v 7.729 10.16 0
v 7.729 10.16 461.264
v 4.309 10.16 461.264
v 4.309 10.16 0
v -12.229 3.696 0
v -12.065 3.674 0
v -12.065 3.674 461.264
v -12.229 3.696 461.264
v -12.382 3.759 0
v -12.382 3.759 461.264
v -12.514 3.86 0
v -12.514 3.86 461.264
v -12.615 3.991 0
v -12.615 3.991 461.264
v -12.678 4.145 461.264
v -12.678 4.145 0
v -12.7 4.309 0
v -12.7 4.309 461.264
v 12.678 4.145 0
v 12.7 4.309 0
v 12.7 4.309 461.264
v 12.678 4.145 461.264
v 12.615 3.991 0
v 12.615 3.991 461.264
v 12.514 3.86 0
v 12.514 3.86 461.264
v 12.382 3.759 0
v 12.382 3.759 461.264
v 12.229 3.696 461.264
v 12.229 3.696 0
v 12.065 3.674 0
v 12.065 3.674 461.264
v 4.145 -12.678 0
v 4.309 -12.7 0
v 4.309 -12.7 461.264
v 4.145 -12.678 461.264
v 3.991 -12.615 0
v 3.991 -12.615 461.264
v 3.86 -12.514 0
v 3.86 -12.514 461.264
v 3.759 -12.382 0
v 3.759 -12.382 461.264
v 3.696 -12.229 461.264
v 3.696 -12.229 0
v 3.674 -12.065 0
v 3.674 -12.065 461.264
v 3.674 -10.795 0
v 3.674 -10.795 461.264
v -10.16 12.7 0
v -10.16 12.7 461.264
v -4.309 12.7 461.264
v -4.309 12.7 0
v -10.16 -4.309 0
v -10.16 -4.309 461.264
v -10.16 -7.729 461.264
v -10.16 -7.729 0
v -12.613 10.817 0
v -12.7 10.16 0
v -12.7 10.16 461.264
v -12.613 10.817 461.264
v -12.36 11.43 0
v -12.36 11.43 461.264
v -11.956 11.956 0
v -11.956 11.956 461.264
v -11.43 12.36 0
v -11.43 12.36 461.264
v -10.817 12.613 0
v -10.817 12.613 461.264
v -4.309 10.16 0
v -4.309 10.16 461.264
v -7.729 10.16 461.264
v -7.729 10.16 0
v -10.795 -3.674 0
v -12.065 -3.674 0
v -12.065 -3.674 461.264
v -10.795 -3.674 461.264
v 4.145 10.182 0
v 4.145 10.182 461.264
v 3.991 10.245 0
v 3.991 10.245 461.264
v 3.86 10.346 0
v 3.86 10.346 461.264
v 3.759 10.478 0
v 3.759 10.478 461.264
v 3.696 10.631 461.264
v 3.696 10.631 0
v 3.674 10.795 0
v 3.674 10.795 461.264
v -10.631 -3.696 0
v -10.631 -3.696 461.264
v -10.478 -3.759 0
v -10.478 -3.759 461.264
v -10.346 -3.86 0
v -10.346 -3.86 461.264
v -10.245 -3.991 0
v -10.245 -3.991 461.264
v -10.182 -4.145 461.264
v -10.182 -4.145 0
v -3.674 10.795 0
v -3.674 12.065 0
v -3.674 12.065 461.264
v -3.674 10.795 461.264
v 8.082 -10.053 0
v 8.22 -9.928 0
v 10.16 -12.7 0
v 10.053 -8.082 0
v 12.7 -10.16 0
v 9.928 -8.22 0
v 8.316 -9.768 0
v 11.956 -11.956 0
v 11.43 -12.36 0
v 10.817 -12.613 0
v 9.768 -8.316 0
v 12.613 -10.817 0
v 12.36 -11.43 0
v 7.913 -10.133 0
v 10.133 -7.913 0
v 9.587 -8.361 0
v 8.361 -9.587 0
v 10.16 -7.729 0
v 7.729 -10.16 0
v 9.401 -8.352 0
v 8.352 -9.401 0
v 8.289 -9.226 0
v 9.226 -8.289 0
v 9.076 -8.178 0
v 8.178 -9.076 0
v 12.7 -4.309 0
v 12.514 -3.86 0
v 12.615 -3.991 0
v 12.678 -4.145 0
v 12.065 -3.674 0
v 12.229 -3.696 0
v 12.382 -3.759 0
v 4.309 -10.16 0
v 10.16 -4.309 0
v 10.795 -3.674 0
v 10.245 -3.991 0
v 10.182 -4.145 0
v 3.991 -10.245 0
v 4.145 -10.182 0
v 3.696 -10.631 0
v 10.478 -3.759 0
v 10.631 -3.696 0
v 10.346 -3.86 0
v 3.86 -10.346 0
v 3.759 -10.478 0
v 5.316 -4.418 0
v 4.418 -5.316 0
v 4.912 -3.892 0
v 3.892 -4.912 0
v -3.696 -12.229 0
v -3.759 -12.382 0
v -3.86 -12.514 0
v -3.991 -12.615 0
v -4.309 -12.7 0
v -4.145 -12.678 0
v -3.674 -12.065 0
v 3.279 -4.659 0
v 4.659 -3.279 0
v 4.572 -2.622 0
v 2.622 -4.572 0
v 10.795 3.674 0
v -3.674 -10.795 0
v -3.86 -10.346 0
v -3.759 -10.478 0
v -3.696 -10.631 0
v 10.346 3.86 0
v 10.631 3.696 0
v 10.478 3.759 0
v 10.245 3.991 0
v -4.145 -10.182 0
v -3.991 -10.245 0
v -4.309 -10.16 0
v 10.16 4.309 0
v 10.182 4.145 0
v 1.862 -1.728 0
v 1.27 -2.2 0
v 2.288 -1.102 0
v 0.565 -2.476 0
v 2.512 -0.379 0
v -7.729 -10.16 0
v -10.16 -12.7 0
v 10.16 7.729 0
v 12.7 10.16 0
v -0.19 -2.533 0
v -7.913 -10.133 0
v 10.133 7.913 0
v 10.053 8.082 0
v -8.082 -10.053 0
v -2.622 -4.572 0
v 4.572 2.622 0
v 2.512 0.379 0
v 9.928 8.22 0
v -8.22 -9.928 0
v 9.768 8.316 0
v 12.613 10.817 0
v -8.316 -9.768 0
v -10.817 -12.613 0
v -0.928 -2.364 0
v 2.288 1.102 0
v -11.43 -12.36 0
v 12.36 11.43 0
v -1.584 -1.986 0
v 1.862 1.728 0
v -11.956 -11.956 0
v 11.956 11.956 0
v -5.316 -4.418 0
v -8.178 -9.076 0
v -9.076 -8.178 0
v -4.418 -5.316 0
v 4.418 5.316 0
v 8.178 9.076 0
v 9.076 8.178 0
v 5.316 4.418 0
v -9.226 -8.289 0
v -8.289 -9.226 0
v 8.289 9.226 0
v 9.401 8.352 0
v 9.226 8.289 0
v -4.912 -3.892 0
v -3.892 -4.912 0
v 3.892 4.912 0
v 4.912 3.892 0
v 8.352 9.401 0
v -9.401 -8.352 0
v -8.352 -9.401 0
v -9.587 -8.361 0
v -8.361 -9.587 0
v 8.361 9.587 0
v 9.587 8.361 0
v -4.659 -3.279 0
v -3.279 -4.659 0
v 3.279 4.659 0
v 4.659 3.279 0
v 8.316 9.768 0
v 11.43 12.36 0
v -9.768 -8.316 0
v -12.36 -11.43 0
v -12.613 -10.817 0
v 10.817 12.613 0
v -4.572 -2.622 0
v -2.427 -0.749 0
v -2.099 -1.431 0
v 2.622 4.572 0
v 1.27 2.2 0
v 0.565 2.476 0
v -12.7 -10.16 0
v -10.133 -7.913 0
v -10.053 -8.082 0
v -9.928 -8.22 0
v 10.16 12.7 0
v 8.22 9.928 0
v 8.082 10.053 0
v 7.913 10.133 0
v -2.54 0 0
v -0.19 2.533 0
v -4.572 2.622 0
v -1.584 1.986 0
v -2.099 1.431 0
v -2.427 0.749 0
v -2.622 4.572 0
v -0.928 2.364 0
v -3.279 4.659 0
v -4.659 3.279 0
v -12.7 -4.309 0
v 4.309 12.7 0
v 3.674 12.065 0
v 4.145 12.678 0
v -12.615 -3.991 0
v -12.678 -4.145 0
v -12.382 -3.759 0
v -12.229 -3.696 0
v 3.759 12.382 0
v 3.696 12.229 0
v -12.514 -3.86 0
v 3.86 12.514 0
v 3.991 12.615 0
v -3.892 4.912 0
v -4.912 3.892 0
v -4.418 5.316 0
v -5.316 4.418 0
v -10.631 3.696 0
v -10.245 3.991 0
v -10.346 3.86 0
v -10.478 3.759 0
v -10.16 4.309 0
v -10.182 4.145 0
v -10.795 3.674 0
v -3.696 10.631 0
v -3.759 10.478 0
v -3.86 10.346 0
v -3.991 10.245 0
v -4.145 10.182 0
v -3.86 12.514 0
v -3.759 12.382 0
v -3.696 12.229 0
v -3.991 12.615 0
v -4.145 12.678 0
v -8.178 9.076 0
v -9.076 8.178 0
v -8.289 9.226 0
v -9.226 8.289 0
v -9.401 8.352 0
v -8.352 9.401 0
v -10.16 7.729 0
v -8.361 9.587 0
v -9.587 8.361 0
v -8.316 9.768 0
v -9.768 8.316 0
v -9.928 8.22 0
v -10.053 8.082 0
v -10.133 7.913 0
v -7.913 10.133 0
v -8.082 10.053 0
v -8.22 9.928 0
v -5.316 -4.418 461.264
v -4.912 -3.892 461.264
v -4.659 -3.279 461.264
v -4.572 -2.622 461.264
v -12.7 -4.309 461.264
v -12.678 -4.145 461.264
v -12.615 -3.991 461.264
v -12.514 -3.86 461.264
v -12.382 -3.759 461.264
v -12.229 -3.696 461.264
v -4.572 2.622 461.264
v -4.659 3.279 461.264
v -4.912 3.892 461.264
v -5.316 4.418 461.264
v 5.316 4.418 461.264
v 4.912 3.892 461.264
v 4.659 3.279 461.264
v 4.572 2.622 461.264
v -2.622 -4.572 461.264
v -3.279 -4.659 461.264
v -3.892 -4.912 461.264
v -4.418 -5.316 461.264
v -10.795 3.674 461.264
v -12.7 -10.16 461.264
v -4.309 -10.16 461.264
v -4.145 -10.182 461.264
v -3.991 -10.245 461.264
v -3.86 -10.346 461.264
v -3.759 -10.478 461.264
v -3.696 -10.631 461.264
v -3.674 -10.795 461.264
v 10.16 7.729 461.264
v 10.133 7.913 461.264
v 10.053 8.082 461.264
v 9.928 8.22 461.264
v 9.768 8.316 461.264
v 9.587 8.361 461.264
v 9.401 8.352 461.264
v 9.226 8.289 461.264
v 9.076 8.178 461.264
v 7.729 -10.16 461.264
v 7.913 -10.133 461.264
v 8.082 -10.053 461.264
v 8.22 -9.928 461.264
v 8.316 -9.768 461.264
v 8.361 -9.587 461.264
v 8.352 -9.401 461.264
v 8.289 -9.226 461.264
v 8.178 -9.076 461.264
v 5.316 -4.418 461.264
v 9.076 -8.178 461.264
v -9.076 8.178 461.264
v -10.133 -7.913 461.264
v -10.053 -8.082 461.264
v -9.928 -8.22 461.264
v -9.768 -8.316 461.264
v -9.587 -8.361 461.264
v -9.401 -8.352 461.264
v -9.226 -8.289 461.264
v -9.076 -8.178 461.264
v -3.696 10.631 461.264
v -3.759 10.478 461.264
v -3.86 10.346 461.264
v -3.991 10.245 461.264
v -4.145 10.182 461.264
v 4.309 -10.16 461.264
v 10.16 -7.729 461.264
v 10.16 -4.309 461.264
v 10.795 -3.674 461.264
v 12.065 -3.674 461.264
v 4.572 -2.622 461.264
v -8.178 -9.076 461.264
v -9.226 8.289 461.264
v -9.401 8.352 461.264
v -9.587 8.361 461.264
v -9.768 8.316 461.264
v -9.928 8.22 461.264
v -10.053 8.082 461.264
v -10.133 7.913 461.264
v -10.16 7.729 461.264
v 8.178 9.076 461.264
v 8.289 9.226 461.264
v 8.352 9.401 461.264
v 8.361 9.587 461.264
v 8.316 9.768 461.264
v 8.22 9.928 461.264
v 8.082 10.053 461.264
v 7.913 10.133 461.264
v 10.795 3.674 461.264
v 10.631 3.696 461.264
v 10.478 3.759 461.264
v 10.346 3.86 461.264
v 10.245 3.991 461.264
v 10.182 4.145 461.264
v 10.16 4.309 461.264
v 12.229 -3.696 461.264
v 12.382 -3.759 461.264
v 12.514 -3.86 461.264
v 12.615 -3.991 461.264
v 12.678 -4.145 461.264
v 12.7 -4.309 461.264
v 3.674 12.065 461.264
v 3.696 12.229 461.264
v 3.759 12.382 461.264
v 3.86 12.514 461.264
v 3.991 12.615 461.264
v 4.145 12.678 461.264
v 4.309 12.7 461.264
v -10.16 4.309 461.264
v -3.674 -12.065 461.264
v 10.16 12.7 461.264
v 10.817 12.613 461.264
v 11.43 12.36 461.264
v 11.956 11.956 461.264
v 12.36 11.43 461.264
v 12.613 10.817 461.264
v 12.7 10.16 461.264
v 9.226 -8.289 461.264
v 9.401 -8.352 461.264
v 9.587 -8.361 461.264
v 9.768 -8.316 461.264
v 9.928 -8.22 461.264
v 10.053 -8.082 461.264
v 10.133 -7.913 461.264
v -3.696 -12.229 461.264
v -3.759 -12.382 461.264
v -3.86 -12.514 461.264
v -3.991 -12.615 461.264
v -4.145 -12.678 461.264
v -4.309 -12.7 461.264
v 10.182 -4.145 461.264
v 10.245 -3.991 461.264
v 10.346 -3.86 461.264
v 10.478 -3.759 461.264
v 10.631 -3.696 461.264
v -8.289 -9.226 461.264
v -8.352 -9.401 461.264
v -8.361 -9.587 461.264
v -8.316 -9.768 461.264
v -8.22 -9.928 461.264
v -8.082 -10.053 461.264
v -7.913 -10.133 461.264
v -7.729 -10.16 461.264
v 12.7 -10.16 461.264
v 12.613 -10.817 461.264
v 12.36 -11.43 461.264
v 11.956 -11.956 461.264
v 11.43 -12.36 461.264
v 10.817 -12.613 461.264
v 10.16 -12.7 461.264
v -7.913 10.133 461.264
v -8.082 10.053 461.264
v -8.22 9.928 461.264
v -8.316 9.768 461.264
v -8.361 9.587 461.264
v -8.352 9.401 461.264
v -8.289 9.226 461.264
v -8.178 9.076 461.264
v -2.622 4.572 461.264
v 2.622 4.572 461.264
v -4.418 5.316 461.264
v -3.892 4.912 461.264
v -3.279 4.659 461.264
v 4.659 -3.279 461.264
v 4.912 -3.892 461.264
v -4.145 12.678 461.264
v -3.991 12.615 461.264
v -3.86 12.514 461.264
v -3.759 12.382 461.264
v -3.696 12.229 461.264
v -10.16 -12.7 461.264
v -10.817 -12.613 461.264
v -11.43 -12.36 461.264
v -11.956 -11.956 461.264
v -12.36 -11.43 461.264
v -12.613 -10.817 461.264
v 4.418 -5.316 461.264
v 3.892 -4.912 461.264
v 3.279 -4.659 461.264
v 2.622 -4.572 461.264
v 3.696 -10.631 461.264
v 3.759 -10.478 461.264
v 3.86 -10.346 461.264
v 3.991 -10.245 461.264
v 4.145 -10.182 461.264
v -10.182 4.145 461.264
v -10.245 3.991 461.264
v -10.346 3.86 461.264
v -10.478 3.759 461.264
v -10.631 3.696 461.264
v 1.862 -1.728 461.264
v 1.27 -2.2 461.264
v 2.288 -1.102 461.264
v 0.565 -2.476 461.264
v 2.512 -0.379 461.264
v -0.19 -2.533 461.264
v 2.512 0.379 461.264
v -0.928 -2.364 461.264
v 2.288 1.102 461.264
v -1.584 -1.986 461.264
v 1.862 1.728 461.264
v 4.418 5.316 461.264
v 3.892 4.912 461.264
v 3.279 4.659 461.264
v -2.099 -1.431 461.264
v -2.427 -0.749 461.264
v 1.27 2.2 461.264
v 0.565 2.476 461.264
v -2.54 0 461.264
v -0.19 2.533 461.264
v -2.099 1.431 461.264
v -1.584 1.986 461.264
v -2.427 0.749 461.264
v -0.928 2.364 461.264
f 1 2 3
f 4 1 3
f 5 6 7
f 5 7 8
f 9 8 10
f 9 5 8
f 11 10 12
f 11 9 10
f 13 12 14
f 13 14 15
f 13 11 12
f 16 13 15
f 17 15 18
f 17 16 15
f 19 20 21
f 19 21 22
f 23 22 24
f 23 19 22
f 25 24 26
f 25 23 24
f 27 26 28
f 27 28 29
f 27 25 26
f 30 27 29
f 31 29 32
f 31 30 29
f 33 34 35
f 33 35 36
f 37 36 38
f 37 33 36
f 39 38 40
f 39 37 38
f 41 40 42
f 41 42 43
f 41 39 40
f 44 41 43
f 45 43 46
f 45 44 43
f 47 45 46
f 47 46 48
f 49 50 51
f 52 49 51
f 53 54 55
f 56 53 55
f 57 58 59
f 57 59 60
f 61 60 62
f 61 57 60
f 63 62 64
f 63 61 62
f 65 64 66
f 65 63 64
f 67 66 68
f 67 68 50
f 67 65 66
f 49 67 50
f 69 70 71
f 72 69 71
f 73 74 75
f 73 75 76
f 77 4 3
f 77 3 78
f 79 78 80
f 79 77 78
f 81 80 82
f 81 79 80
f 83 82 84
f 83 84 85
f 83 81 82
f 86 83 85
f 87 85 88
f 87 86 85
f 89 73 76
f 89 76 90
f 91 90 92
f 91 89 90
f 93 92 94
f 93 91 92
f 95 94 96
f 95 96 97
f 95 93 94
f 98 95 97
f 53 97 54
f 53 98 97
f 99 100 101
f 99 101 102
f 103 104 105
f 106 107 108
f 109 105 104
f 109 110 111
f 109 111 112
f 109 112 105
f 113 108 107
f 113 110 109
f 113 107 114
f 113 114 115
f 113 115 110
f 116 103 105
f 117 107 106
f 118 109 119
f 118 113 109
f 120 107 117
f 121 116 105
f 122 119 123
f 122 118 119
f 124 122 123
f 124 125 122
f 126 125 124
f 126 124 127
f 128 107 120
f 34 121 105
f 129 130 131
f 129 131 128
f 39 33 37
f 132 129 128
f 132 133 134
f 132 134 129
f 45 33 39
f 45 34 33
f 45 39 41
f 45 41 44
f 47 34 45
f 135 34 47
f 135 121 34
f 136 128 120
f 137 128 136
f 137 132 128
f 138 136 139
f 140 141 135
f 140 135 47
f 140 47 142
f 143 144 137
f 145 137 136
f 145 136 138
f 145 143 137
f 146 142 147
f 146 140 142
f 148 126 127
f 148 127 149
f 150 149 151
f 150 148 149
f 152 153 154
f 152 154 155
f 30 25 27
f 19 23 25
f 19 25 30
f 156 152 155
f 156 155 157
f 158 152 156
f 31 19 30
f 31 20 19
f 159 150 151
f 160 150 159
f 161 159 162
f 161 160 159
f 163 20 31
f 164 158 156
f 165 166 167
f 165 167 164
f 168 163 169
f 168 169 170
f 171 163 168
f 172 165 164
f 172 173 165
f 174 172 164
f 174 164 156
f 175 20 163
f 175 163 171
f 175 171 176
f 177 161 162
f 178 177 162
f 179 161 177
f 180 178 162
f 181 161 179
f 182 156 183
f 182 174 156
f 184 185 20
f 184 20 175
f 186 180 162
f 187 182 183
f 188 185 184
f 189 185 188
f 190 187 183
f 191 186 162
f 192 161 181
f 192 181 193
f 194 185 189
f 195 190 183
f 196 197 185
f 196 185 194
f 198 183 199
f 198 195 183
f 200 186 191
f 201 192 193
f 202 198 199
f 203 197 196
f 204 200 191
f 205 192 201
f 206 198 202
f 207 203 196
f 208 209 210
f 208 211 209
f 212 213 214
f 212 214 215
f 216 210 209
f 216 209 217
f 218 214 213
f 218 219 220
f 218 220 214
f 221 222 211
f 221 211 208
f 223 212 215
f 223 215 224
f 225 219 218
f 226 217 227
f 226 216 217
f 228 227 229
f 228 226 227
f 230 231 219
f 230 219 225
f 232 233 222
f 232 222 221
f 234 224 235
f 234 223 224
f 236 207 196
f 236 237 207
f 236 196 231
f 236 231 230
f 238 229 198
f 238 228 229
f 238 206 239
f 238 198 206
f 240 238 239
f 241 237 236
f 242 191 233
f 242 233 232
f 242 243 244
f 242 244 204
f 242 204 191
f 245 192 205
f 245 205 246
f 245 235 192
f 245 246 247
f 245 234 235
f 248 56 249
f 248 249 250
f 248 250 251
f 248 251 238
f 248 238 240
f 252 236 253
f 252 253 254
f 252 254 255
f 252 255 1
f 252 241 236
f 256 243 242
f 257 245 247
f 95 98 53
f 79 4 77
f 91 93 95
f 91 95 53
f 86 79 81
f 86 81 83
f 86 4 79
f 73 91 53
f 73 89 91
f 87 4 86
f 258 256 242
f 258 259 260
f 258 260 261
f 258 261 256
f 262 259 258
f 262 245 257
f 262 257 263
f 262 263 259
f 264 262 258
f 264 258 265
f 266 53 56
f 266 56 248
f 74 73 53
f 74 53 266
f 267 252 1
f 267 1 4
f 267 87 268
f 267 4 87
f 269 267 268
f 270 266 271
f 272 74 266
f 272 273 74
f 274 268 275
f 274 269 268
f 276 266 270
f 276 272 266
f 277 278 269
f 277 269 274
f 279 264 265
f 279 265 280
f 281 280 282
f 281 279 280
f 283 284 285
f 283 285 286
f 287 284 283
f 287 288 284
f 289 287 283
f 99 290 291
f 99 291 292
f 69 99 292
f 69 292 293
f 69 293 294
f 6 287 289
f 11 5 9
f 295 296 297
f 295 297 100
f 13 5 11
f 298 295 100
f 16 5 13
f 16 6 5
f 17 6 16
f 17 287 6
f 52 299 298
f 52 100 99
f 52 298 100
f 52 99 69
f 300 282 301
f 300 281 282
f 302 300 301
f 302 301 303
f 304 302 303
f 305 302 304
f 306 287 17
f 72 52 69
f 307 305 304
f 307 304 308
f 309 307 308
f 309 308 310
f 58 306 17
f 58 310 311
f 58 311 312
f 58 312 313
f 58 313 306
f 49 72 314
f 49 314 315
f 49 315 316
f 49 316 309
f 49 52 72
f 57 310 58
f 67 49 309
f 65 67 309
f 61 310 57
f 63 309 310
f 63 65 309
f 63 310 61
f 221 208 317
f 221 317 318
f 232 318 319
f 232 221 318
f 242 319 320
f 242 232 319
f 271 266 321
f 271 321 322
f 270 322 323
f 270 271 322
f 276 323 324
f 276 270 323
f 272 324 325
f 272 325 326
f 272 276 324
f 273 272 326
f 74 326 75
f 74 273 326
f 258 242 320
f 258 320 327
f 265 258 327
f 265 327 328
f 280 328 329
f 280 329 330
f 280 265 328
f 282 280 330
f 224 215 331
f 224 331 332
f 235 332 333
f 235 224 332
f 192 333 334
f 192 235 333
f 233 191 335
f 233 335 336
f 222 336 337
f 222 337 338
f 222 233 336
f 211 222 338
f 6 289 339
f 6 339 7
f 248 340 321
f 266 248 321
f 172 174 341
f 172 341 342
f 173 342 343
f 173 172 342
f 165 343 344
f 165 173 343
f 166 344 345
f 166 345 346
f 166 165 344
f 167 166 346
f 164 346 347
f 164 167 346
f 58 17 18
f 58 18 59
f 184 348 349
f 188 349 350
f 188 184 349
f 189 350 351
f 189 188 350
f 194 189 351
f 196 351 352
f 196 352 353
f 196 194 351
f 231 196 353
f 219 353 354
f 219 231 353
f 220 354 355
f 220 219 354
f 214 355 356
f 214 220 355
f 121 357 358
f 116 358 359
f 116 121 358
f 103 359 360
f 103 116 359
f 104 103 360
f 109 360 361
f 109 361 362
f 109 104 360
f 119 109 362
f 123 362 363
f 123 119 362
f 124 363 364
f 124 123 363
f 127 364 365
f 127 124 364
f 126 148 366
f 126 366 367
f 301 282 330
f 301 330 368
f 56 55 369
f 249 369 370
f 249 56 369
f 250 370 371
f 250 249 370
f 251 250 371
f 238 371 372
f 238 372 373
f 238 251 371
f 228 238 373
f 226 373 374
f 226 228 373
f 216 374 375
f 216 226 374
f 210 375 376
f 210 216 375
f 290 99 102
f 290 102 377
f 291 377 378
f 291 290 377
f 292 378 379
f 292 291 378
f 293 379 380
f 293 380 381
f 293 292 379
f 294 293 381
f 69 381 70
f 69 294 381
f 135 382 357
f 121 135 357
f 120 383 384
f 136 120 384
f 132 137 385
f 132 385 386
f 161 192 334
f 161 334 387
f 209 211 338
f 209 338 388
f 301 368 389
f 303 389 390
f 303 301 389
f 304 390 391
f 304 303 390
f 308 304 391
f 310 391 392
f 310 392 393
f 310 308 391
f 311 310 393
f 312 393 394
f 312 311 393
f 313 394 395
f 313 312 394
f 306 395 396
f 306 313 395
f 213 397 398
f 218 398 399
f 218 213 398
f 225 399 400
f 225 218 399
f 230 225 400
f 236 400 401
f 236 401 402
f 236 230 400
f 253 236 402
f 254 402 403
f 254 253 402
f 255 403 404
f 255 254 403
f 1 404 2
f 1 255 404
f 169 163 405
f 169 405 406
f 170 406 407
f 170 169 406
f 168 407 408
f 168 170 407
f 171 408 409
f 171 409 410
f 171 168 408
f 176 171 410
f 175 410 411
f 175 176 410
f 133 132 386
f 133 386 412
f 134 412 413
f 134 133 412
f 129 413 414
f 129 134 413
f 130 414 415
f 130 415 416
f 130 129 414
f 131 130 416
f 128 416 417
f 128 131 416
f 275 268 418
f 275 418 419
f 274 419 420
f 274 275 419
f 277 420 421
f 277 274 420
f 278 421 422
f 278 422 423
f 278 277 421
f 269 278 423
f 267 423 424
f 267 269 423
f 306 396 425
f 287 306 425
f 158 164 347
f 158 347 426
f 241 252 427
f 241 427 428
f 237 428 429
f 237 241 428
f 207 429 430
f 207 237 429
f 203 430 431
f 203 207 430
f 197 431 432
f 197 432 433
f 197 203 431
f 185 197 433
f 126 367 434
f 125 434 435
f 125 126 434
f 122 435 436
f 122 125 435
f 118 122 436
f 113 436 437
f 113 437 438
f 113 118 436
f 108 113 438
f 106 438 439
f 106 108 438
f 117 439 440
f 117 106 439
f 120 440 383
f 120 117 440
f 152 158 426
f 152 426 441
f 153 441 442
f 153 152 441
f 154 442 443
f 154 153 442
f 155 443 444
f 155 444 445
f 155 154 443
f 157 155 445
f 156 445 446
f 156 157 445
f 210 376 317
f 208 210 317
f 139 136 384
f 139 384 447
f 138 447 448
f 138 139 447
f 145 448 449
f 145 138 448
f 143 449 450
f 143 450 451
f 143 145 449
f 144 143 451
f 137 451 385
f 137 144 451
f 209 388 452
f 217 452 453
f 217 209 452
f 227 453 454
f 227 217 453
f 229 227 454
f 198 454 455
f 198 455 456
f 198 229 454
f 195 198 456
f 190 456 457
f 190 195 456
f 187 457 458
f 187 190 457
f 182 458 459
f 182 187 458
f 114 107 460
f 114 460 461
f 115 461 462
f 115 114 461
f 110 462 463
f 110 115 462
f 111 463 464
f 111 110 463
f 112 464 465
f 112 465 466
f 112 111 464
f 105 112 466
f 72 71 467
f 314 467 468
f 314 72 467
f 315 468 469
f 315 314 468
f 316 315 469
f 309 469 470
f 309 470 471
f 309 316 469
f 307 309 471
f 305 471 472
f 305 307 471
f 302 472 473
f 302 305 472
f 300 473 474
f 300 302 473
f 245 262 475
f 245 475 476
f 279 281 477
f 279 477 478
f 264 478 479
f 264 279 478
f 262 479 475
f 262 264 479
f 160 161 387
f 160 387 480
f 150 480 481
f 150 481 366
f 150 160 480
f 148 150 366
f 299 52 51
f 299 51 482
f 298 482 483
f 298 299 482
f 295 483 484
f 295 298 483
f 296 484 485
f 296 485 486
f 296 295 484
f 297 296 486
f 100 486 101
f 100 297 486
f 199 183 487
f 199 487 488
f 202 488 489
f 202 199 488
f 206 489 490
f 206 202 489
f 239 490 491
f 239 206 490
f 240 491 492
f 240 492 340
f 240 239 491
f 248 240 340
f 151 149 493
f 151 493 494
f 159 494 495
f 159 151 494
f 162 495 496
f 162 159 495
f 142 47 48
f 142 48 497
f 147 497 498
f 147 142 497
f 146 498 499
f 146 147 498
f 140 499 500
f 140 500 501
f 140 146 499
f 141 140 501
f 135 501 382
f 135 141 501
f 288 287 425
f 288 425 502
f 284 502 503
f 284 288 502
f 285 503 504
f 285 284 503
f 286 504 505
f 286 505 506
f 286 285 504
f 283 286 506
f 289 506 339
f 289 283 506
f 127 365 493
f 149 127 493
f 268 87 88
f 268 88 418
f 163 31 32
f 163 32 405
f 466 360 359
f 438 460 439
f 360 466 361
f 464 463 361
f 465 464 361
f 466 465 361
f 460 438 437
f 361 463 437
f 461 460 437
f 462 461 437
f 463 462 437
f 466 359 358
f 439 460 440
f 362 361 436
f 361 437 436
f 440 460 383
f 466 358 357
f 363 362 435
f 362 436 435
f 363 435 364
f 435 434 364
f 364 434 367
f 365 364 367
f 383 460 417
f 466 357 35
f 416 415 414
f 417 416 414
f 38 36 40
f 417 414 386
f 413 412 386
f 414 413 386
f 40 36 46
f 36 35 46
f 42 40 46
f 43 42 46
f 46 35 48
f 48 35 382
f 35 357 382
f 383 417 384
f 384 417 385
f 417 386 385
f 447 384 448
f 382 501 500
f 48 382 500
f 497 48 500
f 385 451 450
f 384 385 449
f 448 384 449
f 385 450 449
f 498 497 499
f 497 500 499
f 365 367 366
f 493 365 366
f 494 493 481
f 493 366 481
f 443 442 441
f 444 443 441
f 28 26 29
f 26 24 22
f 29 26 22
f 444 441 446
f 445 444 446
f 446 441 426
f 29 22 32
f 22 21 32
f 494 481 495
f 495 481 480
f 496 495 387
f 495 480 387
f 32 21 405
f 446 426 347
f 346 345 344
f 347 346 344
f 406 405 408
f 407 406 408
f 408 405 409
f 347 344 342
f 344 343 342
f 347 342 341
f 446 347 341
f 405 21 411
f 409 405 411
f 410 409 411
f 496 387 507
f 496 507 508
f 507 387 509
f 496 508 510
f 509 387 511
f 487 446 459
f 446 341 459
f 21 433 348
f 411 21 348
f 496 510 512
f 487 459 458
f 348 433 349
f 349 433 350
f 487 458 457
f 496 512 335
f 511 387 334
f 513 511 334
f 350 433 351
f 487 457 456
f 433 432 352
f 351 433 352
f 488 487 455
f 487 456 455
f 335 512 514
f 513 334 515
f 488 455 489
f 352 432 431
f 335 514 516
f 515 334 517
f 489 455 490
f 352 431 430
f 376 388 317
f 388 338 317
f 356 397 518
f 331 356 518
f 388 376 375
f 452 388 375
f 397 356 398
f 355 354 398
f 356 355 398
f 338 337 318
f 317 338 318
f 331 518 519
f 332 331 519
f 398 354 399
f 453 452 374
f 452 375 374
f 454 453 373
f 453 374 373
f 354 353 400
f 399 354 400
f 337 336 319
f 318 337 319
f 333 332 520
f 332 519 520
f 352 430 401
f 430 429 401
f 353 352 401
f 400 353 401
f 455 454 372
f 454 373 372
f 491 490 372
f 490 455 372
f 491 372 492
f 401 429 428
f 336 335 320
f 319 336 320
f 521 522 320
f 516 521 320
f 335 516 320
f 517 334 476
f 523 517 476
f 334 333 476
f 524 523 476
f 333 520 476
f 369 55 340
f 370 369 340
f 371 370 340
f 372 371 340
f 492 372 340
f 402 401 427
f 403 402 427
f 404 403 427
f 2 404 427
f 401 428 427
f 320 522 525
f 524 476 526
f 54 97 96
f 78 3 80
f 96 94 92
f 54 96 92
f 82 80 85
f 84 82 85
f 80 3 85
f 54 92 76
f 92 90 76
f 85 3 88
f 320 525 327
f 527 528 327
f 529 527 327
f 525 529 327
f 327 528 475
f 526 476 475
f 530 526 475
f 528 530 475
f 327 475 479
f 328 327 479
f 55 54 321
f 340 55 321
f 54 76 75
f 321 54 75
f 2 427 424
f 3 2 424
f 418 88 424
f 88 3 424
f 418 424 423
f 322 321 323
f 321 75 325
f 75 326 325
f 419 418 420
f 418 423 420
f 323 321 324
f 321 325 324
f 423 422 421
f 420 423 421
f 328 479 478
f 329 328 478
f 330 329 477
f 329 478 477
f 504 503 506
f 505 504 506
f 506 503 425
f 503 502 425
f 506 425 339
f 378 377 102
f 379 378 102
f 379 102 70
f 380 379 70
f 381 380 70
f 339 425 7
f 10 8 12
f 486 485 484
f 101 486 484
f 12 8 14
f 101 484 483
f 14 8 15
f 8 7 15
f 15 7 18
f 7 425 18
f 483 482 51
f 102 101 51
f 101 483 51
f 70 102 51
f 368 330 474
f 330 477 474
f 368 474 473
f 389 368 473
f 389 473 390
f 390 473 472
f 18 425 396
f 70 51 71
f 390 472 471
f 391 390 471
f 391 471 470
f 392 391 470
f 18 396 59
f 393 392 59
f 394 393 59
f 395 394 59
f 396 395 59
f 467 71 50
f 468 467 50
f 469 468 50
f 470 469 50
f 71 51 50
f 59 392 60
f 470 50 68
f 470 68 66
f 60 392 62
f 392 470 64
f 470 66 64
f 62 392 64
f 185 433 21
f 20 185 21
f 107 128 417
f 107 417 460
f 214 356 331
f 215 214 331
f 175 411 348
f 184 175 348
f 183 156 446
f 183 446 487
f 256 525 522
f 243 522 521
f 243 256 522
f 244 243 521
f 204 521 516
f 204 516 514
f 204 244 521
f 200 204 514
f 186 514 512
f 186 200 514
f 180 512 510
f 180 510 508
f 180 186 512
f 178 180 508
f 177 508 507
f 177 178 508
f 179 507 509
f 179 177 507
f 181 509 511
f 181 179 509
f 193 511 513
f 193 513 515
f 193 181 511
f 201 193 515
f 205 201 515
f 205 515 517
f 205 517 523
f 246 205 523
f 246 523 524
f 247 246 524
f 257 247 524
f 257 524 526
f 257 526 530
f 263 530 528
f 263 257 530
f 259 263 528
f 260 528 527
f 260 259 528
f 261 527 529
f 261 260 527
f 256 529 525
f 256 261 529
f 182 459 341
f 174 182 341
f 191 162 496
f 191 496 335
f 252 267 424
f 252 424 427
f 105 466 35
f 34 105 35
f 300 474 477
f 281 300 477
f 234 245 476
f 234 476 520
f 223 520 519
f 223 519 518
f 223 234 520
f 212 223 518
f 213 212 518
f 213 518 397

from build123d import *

# Parameters (mm, degrees)
SKETCH1_R           = 2.54
BOSS_EXTRUDE1_DEPTH = 461.264


with BuildPart() as part:
    # Sketch1 → Boss-Extrude1 (new body)
    with BuildSketch(Plane.XY):
        with BuildLine():
            Line((4.417923164, 5.315948776), (8.177961582, 9.075987194))
            ThreePointArc((8.177961582, 9.075987194), (8.315612279, 9.76800398), (7.728948776, 10.16))
            Line((7.728948776, 10.16), (4.308974388, 10.16))
            ThreePointArc((4.308974388, 10.16), (3.859961582, 10.345987194), (3.673974388, 10.795))
            Line((3.673974388, 10.795), (3.673974388, 12.065))
            ThreePointArc((3.673974388, 12.065), (3.859961582, 12.514012806), (4.308974388, 12.7))
            Line((4.308974388, 12.7), (10.16, 12.7))
            ThreePointArc((10.16, 12.7), (11.956051224, 11.956051224), (12.7, 10.16))
            Line((12.7, 10.16), (12.7, 4.308974388))
            ThreePointArc((12.7, 4.308974388), (12.514012806, 3.859961582), (12.065, 3.673974388))
            Line((12.065, 3.673974388), (10.795, 3.673974388))
            ThreePointArc((10.795, 3.673974388), (10.345987194, 3.859961582), (10.16, 4.308974388))
            Line((10.16, 4.308974388), (10.16, 7.728948776))
            ThreePointArc((10.16, 7.728948776), (9.76800398, 8.315612279), (9.075987194, 8.177961582))
            Line((9.075987194, 8.177961582), (5.315948776, 4.417923164))
            ThreePointArc((5.315948776, 4.417923164), (4.765345987, 3.593887858), (4.572, 2.621871939))
            Line((4.572, 2.621871939), (4.572, -2.621871939))
            ThreePointArc((4.572, -2.621871939), (4.765345987, -3.593887858), (5.315948776, -4.417923164))
            Line((5.315948776, -4.417923164), (9.075987194, -8.177961582))
            ThreePointArc((9.075987194, -8.177961582), (9.76800398, -8.315612279), (10.16, -7.728948776))
            Line((10.16, -7.728948776), (10.16, -4.308974388))
            ThreePointArc((10.16, -4.308974388), (10.345987194, -3.859961582), (10.795, -3.673974388))
            Line((10.795, -3.673974388), (12.065, -3.673974388))
            ThreePointArc((12.065, -3.673974388), (12.514012806, -3.859961582), (12.7, -4.308974388))
            Line((12.7, -4.308974388), (12.7, -10.16))
            ThreePointArc((12.7, -10.16), (11.956051224, -11.956051224), (10.16, -12.7))
            Line((10.16, -12.7), (4.308974388, -12.7))
            ThreePointArc((4.308974388, -12.7), (3.859961582, -12.514012806), (3.673974388, -12.065))
            Line((3.673974388, -12.065), (3.673974388, -10.795))
            ThreePointArc((3.673974388, -10.795), (3.859961582, -10.345987194), (4.308974388, -10.16))
            Line((4.308974388, -10.16), (7.728948776, -10.16))
            ThreePointArc((7.728948776, -10.16), (8.315612279, -9.76800398), (8.177961582, -9.075987194))
            Line((8.177961582, -9.075987194), (4.417923164, -5.315948776))
            ThreePointArc((4.417923164, -5.315948776), (3.593887858, -4.765345987), (2.621871939, -4.572))
            Line((2.621871939, -4.572), (-2.621871939, -4.572))
            ThreePointArc((-2.621871939, -4.572), (-3.593887858, -4.765345987), (-4.417923164, -5.315948776))
            Line((-4.417923164, -5.315948776), (-8.177961582, -9.075987194))
            ThreePointArc((-8.177961582, -9.075987194), (-8.315612279, -9.76800398), (-7.728948776, -10.16))
            Line((-7.728948776, -10.16), (-4.308974388, -10.16))
            ThreePointArc((-4.308974388, -10.16), (-3.859961582, -10.345987194), (-3.673974388, -10.795))
            Line((-3.673974388, -10.795), (-3.673974388, -12.065))
            ThreePointArc((-3.673974388, -12.065), (-3.859961582, -12.514012806), (-4.308974388, -12.7))
            Line((-4.308974388, -12.7), (-10.16, -12.7))
            ThreePointArc((-10.16, -12.7), (-11.956051224, -11.956051224), (-12.7, -10.16))
            Line((-12.7, -10.16), (-12.7, -4.308974388))
            ThreePointArc((-12.7, -4.308974388), (-12.514012806, -3.859961582), (-12.065, -3.673974388))
            Line((-12.065, -3.673974388), (-10.795, -3.673974388))
            ThreePointArc((-10.795, -3.673974388), (-10.345987194, -3.859961582), (-10.16, -4.308974388))
            Line((-10.16, -4.308974388), (-10.16, -7.728948776))
            ThreePointArc((-10.16, -7.728948776), (-9.76800398, -8.315612279), (-9.075987194, -8.177961582))
            Line((-9.075987194, -8.177961582), (-5.315948776, -4.417923164))
            ThreePointArc((-5.315948776, -4.417923164), (-4.765345987, -3.593887858), (-4.572, -2.621871939))
            Line((-4.572, -2.621871939), (-4.572, 2.621871939))
            ThreePointArc((-4.572, 2.621871939), (-4.765345987, 3.593887858), (-5.315948776, 4.417923164))
            Line((-5.315948776, 4.417923164), (-9.075987194, 8.177961582))
            ThreePointArc((-9.075987194, 8.177961582), (-9.76800398, 8.315612279), (-10.16, 7.728948776))
            Line((-10.16, 7.728948776), (-10.16, 4.308974388))
            ThreePointArc((-10.16, 4.308974388), (-10.345987194, 3.859961582), (-10.795, 3.673974388))
            Line((-10.795, 3.673974388), (-12.065, 3.673974388))
            ThreePointArc((-12.065, 3.673974388), (-12.514012806, 3.859961582), (-12.7, 4.308974388))
            Line((-12.7, 4.308974388), (-12.7, 10.16))
            ThreePointArc((-12.7, 10.16), (-11.956051224, 11.956051224), (-10.16, 12.7))
            Line((-10.16, 12.7), (-4.308974388, 12.7))
            ThreePointArc((-4.308974388, 12.7), (-3.859961582, 12.514012806), (-3.673974388, 12.065))
            Line((-3.673974388, 12.065), (-3.673974388, 10.795))
            ThreePointArc((-3.673974388, 10.795), (-3.859961582, 10.345987194), (-4.308974388, 10.16))
            Line((-4.308974388, 10.16), (-7.728948776, 10.16))
            ThreePointArc((-7.728948776, 10.16), (-8.315612279, 9.76800398), (-8.177961582, 9.075987194))
            Line((-8.177961582, 9.075987194), (-4.417923164, 5.315948776))
            ThreePointArc((-4.417923164, 5.315948776), (-3.593887858, 4.765345987), (-2.621871939, 4.572))
            Line((-2.621871939, 4.572), (2.621871939, 4.572))
            ThreePointArc((2.621871939, 4.572), (3.593887858, 4.765345987), (4.417923164, 5.315948776))
        make_face()
        with Locations(Location((0, 0, 0), (0, 0, 180))):
            Circle(SKETCH1_R, mode=Mode.SUBTRACT)
    extrude(amount=BOSS_EXTRUDE1_DEPTH)


solid = part.part
